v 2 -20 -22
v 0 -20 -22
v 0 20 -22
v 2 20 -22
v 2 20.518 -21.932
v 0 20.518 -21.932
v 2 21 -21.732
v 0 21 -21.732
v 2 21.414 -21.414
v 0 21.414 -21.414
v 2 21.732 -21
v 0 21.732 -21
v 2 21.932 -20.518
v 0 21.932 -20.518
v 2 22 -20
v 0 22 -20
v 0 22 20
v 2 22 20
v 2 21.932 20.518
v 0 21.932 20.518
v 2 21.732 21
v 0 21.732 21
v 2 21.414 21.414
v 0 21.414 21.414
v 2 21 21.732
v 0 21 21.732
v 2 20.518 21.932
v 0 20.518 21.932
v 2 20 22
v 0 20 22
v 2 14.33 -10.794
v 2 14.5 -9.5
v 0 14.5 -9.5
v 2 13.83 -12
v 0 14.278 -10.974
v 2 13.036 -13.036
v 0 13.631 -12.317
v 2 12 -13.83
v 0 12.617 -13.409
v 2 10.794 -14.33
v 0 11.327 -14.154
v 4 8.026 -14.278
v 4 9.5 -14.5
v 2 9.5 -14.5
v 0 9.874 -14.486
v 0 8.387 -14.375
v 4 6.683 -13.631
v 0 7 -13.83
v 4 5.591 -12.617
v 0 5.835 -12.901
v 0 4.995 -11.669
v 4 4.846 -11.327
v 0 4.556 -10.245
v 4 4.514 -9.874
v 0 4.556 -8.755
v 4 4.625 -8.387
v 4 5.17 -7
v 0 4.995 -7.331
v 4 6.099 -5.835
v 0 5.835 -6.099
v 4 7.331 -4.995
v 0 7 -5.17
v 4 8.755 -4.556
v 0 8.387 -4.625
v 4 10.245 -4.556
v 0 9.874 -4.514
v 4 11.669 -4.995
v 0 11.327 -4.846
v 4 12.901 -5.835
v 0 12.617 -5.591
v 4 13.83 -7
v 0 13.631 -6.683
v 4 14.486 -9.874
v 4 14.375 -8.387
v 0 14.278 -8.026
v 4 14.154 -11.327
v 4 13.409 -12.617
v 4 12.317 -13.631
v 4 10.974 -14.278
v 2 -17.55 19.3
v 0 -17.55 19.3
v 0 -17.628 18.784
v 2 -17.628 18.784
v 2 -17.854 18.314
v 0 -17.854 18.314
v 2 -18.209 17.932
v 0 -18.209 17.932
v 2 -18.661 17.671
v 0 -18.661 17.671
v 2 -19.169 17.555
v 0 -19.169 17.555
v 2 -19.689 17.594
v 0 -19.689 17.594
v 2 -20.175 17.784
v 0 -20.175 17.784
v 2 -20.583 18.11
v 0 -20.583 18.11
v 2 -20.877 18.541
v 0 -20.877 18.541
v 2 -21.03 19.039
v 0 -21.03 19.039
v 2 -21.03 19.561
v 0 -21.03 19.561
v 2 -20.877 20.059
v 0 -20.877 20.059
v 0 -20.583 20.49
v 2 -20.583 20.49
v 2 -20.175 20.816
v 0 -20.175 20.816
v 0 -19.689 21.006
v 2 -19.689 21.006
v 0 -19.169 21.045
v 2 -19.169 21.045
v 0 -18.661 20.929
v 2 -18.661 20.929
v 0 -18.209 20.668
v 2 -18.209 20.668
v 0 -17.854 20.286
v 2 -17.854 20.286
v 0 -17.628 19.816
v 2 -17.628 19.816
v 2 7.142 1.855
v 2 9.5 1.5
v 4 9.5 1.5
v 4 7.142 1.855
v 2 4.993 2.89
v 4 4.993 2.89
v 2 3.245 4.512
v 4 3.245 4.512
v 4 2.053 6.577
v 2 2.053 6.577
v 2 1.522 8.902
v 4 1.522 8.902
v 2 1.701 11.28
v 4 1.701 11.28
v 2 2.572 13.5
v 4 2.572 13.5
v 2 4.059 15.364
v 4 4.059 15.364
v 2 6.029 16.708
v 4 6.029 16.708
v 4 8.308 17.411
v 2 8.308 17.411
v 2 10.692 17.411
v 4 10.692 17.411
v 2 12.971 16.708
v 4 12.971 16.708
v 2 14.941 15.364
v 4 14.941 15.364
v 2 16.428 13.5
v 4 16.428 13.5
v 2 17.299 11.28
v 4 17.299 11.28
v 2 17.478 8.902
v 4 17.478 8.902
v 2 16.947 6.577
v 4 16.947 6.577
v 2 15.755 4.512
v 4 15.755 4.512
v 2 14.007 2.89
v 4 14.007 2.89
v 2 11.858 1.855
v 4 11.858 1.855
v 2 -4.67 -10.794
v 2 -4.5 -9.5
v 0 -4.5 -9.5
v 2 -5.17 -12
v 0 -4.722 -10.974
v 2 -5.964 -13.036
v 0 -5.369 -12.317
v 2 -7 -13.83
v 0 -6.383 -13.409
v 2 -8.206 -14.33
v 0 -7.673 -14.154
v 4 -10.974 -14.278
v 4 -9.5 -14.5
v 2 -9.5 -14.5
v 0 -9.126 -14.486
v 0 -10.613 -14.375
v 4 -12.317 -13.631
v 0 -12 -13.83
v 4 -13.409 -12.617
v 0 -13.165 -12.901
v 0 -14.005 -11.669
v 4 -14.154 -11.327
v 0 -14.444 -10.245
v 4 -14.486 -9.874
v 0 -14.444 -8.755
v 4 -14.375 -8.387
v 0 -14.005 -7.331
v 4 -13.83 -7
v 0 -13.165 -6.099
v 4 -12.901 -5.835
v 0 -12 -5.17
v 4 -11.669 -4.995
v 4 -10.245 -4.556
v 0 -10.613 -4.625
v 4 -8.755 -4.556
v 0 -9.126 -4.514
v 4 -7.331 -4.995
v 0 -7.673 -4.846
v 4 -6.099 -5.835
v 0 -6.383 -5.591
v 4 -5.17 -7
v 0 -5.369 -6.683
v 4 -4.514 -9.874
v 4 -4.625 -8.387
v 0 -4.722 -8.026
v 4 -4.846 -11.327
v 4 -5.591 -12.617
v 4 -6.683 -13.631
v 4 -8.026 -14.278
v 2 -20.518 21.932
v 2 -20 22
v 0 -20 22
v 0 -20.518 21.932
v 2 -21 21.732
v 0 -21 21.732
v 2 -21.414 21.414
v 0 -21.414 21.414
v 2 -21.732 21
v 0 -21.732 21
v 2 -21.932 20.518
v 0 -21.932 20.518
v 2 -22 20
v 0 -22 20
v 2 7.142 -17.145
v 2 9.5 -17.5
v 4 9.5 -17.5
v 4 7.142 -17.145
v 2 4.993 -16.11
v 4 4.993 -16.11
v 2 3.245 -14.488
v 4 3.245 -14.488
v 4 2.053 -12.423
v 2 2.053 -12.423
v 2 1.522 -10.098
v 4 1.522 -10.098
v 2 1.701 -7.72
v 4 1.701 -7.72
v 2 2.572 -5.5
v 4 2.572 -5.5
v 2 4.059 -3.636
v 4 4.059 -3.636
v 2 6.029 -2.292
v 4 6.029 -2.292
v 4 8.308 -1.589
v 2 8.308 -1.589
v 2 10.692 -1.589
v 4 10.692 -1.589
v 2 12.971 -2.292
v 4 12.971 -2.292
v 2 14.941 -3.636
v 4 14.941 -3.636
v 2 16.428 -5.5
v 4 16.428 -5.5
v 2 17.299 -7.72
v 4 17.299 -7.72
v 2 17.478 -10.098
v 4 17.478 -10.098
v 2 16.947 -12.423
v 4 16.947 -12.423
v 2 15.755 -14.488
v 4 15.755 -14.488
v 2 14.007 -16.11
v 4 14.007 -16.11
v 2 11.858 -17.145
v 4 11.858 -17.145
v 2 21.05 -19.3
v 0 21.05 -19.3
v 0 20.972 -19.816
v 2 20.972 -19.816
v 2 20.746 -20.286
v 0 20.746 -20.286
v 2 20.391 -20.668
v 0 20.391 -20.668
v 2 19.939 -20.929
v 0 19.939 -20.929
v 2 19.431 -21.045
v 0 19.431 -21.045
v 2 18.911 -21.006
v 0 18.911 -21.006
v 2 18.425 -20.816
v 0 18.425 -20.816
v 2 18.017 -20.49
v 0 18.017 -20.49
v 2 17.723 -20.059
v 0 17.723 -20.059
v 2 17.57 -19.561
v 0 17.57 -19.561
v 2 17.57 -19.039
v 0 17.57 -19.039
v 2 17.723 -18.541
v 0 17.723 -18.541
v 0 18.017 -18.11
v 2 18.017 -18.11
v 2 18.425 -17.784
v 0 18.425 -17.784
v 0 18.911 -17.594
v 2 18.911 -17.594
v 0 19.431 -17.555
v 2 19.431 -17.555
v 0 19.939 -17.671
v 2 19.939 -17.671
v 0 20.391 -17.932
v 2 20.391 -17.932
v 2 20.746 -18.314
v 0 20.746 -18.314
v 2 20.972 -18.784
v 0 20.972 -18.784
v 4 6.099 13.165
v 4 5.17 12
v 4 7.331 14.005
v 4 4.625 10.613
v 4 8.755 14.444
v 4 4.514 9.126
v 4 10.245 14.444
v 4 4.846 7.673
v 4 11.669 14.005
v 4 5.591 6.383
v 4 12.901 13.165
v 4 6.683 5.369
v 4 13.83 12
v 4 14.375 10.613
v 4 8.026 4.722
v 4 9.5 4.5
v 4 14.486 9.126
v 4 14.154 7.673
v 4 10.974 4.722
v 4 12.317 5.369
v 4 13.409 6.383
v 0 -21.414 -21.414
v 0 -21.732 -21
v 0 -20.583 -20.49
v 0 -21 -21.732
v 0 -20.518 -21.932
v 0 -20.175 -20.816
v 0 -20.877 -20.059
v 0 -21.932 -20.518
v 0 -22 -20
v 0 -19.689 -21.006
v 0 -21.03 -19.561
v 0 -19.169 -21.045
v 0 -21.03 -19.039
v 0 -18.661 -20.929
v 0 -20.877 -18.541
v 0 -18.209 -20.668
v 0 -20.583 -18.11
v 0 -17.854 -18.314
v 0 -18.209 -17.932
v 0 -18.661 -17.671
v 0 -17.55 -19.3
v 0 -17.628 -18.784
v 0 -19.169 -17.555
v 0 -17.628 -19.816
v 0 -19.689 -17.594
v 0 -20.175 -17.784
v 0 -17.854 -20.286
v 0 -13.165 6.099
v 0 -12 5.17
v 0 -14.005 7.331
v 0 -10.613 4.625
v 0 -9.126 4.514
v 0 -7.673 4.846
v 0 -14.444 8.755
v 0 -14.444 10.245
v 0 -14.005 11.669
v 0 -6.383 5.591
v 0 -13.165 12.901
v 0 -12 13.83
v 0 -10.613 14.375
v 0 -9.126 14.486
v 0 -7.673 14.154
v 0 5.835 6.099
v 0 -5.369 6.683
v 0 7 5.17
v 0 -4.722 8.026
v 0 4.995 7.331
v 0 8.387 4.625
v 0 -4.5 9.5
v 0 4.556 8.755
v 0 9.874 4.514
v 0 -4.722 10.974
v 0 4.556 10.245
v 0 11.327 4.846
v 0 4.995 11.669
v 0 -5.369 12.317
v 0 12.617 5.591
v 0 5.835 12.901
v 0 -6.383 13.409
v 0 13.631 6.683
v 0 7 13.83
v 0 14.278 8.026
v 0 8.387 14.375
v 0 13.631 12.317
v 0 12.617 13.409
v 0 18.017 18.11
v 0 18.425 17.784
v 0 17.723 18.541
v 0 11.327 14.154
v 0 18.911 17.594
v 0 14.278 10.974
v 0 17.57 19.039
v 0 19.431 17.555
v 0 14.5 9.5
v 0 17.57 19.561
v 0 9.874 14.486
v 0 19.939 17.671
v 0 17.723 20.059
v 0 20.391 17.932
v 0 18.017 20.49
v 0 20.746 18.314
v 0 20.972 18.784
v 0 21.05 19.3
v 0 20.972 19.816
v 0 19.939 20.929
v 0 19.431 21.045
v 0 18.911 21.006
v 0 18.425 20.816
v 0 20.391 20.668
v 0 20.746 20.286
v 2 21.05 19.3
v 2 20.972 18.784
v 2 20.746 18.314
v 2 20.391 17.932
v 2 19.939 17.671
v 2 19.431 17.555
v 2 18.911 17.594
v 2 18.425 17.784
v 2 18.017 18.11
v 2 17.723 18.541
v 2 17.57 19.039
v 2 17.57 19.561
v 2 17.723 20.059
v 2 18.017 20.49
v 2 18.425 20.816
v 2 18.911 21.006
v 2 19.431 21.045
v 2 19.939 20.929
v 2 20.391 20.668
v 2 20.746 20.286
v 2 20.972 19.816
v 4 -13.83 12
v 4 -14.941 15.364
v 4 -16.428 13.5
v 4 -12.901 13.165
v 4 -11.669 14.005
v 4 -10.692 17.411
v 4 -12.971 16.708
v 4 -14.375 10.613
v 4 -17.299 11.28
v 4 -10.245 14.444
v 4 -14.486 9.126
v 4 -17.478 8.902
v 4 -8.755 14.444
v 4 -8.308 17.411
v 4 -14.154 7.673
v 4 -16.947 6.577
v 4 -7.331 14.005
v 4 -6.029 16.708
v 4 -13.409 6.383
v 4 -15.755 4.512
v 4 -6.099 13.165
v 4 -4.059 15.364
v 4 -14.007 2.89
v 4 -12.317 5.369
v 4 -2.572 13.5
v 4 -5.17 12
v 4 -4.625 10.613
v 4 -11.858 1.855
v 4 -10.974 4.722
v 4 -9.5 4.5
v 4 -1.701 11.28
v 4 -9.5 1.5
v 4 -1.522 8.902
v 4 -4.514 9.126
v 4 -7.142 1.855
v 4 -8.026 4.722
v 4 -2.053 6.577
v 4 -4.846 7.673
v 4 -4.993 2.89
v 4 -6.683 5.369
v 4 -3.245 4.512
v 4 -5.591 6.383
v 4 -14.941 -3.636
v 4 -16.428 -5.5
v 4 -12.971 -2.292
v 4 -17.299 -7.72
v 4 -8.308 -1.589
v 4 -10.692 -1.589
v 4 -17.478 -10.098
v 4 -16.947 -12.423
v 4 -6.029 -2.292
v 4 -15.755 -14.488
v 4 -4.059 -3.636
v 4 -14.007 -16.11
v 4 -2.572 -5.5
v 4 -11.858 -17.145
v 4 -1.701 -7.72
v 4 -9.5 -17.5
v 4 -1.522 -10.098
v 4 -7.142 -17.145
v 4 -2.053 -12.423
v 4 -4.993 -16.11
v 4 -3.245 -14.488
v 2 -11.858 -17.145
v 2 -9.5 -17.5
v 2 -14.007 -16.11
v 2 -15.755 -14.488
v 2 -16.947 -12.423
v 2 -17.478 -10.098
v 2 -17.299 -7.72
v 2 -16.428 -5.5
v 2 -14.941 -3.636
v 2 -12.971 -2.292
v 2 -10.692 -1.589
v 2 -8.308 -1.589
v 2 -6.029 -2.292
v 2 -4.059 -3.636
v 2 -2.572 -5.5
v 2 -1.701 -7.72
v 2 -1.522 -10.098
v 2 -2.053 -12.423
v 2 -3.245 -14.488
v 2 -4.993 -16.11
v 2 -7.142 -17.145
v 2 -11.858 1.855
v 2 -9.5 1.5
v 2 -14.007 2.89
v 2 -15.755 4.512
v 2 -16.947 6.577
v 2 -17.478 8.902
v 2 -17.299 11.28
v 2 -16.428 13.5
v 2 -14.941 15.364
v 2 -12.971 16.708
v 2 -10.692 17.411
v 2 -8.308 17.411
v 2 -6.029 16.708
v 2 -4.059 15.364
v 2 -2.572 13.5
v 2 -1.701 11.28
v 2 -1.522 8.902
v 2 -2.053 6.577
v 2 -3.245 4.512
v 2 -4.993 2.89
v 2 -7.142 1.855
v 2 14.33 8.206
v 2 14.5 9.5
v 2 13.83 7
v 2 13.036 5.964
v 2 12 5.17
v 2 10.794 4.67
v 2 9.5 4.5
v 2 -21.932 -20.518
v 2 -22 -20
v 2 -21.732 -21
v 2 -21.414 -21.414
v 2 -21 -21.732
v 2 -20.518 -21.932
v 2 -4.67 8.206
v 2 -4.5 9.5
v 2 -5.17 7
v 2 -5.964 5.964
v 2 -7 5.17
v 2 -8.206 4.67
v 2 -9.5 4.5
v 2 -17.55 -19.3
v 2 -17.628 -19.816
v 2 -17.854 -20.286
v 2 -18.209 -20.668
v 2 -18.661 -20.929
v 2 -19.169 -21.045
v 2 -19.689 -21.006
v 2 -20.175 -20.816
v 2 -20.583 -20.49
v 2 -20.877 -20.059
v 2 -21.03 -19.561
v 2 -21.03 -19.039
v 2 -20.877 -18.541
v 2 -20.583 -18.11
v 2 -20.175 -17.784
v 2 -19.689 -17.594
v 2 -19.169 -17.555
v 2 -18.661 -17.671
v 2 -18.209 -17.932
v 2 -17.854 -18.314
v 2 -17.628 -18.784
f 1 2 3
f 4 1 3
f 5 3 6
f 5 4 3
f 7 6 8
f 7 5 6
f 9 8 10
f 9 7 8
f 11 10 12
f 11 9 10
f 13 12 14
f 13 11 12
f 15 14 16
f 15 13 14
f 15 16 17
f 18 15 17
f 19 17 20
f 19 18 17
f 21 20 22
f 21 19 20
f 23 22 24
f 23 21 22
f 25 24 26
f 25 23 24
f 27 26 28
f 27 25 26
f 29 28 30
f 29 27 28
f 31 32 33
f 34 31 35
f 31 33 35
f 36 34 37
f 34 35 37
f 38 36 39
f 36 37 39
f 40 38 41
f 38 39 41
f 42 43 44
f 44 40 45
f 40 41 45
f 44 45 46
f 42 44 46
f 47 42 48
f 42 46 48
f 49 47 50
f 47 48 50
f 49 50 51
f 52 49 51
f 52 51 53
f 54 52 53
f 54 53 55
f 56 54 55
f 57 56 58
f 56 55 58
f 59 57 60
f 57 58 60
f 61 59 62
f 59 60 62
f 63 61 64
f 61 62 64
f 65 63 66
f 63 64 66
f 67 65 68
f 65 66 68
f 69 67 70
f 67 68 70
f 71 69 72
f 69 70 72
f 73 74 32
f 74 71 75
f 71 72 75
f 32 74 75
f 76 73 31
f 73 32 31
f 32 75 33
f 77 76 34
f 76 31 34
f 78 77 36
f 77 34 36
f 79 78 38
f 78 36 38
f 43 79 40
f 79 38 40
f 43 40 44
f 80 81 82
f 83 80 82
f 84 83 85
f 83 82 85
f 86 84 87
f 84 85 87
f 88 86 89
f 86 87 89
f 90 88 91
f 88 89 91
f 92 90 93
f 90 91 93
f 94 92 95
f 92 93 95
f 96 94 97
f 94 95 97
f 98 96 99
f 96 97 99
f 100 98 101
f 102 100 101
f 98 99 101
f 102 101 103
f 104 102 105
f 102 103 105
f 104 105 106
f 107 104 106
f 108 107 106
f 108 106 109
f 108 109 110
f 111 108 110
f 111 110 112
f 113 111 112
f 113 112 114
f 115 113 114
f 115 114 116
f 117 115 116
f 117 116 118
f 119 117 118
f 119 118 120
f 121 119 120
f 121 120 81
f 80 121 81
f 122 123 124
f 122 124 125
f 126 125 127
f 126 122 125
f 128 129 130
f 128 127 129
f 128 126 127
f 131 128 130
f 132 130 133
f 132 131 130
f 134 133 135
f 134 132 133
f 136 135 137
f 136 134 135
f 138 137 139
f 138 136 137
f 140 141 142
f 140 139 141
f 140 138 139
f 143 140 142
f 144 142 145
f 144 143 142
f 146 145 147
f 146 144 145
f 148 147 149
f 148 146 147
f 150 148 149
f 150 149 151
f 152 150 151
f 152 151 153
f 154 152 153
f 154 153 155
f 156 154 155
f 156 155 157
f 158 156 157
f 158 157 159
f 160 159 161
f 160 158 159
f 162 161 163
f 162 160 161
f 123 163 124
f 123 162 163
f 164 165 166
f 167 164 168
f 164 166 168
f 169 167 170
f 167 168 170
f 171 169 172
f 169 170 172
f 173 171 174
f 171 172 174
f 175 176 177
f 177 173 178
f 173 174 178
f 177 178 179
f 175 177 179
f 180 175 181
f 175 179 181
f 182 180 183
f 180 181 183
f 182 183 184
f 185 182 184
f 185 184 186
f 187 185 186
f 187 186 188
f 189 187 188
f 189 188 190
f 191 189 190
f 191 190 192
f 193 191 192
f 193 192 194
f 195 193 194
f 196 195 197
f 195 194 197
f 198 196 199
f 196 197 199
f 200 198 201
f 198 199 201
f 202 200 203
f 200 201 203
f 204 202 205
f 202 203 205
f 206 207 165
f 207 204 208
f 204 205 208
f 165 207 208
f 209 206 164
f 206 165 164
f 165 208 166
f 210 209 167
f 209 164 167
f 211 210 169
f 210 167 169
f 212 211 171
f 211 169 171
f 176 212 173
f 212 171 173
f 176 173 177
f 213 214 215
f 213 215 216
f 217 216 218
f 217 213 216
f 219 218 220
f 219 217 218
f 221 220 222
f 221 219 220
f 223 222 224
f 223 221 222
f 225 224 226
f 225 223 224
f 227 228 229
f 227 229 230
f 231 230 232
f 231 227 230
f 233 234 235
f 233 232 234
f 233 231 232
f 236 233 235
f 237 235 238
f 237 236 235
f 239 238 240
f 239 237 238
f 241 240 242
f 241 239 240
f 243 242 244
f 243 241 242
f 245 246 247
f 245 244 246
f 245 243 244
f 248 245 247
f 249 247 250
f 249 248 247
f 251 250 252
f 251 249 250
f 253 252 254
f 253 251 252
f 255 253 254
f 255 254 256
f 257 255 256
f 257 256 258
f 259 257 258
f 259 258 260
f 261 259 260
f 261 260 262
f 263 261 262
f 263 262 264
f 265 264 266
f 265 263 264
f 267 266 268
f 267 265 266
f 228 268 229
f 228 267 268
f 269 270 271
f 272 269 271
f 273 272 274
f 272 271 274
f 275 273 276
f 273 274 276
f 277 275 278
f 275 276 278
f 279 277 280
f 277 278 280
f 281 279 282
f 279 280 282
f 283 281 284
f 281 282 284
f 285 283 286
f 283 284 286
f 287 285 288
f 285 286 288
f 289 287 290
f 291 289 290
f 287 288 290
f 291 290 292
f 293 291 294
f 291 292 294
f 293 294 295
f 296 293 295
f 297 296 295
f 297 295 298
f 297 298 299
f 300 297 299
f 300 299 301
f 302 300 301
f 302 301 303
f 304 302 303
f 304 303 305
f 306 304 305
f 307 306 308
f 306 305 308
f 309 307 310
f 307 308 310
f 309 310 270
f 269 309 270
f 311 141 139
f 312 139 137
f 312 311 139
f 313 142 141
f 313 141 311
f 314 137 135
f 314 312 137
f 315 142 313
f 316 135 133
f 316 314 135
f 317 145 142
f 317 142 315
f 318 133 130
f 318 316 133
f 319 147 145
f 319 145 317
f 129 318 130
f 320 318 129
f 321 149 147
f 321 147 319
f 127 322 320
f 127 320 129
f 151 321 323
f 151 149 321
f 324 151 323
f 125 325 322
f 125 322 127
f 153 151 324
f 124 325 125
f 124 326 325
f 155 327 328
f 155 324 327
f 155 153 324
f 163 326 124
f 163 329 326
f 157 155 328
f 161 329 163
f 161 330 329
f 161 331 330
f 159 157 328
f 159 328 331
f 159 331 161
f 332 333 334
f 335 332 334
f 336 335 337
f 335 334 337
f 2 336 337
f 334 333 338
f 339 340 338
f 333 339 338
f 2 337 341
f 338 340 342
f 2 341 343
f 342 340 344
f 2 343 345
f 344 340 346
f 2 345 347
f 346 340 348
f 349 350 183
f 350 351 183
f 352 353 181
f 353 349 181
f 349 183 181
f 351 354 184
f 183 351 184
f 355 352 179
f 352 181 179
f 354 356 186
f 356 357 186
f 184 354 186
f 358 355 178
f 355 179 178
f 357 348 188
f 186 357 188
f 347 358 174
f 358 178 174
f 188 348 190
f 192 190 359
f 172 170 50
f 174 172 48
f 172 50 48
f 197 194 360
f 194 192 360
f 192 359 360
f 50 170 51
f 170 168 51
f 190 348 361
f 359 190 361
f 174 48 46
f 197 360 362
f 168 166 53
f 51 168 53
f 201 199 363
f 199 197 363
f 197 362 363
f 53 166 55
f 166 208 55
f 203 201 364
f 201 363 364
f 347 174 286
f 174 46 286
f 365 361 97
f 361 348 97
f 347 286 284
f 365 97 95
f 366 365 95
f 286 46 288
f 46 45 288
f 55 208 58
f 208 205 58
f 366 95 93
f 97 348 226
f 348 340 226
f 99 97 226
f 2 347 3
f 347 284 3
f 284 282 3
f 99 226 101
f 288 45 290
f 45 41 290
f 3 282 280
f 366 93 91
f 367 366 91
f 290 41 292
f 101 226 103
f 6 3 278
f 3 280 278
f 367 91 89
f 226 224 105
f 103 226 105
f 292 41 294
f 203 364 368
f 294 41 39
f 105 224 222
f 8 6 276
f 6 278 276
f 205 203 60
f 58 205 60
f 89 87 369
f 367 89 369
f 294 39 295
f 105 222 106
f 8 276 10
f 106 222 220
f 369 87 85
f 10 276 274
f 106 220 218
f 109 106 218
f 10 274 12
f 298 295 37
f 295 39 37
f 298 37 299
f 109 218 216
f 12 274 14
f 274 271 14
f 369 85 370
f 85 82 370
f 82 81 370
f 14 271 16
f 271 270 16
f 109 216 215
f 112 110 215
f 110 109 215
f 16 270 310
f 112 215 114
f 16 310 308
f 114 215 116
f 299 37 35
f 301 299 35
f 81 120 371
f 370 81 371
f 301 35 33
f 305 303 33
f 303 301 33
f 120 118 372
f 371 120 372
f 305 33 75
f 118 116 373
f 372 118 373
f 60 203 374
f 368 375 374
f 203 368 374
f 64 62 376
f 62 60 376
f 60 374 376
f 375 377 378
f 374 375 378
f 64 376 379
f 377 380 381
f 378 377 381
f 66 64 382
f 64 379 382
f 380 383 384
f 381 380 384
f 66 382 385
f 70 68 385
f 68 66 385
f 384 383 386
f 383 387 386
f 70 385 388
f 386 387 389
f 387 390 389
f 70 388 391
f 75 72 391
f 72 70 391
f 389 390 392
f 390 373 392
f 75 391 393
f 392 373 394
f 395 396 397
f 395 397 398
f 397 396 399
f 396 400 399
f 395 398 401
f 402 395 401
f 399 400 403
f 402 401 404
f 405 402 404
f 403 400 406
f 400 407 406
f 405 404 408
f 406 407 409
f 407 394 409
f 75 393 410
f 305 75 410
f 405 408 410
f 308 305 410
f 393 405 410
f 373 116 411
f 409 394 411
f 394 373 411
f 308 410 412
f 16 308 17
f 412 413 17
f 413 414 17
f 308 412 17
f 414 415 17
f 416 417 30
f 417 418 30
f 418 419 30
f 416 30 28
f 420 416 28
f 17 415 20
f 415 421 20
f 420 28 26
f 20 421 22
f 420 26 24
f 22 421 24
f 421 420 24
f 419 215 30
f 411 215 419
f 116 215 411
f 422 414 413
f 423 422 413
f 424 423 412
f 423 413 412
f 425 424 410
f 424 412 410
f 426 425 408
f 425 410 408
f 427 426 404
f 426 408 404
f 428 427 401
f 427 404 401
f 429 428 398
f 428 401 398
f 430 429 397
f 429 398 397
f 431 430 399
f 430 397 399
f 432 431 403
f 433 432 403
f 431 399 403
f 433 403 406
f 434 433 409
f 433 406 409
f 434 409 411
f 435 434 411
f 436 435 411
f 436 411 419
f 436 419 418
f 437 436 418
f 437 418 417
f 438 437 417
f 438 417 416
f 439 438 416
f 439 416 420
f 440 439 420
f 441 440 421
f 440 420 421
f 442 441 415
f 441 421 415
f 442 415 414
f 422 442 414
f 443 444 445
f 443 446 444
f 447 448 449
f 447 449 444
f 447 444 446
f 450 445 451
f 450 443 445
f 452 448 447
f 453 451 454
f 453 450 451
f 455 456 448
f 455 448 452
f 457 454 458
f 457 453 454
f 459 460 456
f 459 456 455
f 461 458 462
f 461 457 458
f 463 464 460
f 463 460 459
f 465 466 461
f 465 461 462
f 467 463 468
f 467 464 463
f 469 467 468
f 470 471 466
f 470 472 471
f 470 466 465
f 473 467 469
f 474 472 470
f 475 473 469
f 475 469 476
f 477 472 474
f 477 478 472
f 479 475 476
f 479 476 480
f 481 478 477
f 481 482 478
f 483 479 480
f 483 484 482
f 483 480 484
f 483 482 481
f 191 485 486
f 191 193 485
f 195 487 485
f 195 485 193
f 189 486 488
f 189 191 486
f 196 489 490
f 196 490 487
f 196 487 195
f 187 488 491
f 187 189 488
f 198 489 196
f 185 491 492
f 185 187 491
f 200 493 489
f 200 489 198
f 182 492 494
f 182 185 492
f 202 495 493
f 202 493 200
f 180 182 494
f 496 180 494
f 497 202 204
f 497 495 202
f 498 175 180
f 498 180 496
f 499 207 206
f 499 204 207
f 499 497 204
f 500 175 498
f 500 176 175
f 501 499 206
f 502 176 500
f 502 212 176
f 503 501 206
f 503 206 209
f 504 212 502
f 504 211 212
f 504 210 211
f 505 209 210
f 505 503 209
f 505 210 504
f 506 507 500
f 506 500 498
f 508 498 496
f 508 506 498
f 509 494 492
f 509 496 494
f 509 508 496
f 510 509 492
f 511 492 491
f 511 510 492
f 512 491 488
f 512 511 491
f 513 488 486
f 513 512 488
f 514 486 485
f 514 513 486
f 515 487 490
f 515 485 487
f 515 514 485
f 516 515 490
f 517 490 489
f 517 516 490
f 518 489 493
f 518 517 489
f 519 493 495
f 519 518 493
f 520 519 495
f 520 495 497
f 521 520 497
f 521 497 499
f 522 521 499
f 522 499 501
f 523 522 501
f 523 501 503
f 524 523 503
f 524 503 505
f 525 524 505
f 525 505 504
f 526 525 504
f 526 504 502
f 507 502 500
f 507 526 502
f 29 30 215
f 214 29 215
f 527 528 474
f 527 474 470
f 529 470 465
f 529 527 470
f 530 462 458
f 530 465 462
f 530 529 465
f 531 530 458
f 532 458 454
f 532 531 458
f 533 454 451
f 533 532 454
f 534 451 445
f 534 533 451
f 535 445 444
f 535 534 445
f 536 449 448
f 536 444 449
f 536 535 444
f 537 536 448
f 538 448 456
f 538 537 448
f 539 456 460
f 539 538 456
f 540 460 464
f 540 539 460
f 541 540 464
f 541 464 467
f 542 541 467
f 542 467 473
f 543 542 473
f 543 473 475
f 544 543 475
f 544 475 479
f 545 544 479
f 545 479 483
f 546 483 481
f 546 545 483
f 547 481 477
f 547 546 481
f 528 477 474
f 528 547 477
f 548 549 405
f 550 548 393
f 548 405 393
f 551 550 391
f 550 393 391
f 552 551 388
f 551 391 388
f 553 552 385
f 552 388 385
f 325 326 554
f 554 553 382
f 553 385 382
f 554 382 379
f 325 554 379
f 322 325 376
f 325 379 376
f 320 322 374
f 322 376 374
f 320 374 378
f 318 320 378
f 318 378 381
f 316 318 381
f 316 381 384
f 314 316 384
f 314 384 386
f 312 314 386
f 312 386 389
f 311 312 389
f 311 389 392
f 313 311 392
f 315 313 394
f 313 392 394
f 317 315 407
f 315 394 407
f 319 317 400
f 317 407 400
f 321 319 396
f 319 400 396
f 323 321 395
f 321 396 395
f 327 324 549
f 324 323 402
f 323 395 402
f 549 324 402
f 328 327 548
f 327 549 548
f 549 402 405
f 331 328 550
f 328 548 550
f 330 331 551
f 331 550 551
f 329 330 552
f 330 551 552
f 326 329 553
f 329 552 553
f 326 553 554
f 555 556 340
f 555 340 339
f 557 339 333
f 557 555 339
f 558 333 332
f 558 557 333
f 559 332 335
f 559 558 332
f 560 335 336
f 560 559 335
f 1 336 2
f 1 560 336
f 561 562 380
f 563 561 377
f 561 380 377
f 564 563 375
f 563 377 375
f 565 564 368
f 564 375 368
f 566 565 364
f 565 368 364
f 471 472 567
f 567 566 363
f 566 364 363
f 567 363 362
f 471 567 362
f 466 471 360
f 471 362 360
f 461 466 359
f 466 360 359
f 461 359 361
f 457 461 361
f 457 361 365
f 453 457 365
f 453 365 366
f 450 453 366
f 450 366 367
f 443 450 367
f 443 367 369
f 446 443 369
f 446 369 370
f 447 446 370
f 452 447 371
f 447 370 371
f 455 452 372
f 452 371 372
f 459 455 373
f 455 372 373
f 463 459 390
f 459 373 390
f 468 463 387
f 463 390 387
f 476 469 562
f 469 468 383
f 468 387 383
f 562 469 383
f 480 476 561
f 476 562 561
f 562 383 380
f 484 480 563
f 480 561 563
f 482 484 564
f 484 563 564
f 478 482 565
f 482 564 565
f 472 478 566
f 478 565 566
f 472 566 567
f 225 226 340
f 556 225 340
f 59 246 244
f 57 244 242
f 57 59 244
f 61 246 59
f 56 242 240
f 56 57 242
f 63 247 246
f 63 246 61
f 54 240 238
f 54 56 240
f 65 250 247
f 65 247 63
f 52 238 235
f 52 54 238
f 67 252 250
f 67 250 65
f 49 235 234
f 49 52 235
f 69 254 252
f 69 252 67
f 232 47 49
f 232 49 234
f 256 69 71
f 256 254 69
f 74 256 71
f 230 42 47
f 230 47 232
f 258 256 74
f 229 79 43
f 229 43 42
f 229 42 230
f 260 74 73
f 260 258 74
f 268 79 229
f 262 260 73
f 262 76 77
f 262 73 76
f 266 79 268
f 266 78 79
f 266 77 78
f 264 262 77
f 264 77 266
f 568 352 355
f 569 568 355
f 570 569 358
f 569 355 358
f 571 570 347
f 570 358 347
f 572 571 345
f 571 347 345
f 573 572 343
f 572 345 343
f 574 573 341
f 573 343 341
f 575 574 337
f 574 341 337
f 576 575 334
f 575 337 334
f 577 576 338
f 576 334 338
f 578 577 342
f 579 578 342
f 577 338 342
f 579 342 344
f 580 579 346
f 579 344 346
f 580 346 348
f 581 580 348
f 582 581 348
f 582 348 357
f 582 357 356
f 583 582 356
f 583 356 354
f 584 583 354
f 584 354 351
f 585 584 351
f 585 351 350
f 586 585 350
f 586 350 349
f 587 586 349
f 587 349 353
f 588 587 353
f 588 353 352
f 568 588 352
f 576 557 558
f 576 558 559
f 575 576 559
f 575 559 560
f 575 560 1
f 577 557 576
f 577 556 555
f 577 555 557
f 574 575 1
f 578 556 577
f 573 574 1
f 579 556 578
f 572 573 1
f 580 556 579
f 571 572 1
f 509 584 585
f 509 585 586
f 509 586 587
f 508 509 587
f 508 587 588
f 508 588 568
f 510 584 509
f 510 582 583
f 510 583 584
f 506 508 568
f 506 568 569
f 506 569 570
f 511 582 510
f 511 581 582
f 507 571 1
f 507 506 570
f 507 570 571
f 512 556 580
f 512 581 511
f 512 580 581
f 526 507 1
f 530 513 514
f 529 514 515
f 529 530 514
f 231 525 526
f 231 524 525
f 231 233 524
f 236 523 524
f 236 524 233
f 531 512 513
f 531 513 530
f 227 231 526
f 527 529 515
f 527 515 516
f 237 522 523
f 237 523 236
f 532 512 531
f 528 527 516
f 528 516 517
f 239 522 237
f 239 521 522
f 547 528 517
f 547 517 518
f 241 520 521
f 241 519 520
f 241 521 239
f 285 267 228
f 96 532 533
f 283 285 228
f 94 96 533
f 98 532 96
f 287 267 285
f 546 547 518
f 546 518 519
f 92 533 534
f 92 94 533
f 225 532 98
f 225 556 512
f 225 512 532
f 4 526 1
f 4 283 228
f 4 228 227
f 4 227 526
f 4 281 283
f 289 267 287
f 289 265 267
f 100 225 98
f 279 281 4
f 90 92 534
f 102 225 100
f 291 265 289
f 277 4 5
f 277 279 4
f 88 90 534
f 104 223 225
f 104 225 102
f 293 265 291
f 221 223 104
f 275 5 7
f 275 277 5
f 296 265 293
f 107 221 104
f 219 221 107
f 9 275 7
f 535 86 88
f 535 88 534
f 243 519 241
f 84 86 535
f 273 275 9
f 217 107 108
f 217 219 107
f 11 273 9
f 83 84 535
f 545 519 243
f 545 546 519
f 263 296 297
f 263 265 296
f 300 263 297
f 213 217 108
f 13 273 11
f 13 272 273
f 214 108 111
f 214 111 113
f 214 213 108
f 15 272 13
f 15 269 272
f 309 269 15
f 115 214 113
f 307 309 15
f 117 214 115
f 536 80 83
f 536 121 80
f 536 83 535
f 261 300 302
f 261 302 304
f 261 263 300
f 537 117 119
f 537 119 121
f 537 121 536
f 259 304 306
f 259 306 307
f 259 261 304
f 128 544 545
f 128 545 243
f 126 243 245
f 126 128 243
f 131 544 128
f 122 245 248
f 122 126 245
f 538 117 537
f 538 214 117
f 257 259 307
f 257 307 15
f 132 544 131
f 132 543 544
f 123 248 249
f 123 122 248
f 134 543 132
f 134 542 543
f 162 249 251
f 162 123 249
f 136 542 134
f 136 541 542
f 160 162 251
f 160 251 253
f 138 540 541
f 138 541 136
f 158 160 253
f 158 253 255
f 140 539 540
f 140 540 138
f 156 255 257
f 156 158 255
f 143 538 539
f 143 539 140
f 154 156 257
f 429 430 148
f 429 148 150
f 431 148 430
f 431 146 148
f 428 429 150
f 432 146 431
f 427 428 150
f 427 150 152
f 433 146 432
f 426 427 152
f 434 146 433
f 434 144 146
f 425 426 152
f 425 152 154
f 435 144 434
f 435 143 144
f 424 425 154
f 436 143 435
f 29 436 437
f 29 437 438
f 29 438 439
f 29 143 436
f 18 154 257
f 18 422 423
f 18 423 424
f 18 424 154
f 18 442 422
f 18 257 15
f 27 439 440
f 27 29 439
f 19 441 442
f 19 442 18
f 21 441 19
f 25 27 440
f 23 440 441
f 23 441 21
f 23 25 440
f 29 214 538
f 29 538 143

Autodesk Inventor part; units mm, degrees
ref_plane "YZ Plane" through (0, 0, 0) normal (1, 0, 0) x (0, 1, 0)
ref_plane "XZ Plane" through (0, 0, 0) normal (0, 1, 0) x (-1, 0, 0)
ref_plane "XY Plane" through (0, 0, 0) normal (0, 0, 1) x (1, 0, 0)
sketch "Sketch1" plane through (0, 0, 0) normal (1, 0, 0) x (0, 1, 0)
  line L0 (-22, -22) -> (22, -22)
  line L1 (22, -22) -> (22, 22)
  line L2 (22, 22) -> (-22, 22)
  line L3 (-22, 22) -> (-22, -22)
  line L4 (-22, -22) -> (22, 22) construction
  line L5 (22, -22) -> (-22, 22) construction
  line L6 (-19.3, -19.3) -> (19.3, -19.3)
  line L7 (19.3, -19.3) -> (19.3, 19.3)
  line L8 (19.3, 19.3) -> (-19.3, 19.3)
  line L9 (-19.3, 19.3) -> (-19.3, -19.3)
  line L10 (-19.3, -19.3) -> (19.3, 19.3) construction
  line L11 (19.3, -19.3) -> (-19.3, 19.3) construction
  circle A0 centre (19.3, 19.3) radius 1.75
  circle A1 centre (19.3, -19.3) radius 1.75
  circle A2 centre (-19.3, -19.3) radius 1.75
  circle A3 centre (-19.3, 19.3) radius 1.75
  line L12 (19.3, 0) -> (0, 0)
  circle A4 centre (9.5, -9.5) radius 5
  circle A5 centre (9.5, 9.5) radius 5
  line L13 (0, 0) -> (-19.3, 0)
  circle A6 centre (-9.5, -9.5) radius 5
  circle A7 centre (-9.5, 9.5) radius 5
  circle A8 centre (9.5, -9.5) radius 9.5
  circle A9 centre (9.5, 9.5) radius 9.5
  circle A10 centre (-9.5, 9.5) radius 9.5
  circle A11 centre (-9.5, -9.5) radius 9.5
  point P0 (0, 0)
  point P1 (0, 0)
  point P2 (6.364, 6.364)
  dimension "d0" = 44
  dimension "d1" = 44
  dimension "d6" = 38.6
  dimension "d7" = 38.6
  dimension "d8" = 3.5
  dimension "d9" = 3.5
  dimension "d10" = 3.5
  dimension "d11" = 3.5
  dimension "d19" = 10
  dimension "d20" = 10
  dimension "d21" = 10
  dimension "d22" = 10
  dimension "d23" = 19
  dimension "d24" = 19
  dimension "d25" = 19
  dimension "d26" = 19
extrude "Extrusion1" add sketch "Sketch1" along normal blind 2 contours L3 L2 L1 L0 | A2 L9 L13 A11 A8 L12 L7 A1 L6 | L9 A3 L8 A0 L7 L12 A9 A10 L13 | A10 A9 L12 L13 | A10 | L13 L12 A8 A11 | A11 | A9 | A8
fillet "Fillet1" radius 2 4 edges at (1, -22, 22) (1, -22, -22) (1, 22, -22) (1, 22, 22)
sketch "Sketch2" plane through (2, 0, 0) normal (1, 0, 0) x (0, 0, -1)
  arc A0 (-20, 22) -> (-22, 20) centre (-20, 20) ccw projected
  line L0 (-22, 20) -> (-22, -20) projected
  arc A1 (-22, -20) -> (-20, -22) centre (-20, -20) ccw projected
  line L1 (-20, -22) -> (20, -22) projected
  arc A2 (20, -22) -> (22, -20) centre (20, -20) ccw projected
  line L2 (22, -20) -> (22, 20) projected
  arc A3 (22, 20) -> (20, 22) centre (20, 20) ccw projected
  line L3 (20, 22) -> (-20, 22) projected
  circle A4 centre (-19.3, -19.3) radius 1.75 projected
  circle A5 centre (19.3, -19.3) radius 1.75 projected
  circle A6 centre (9.5, 9.5) radius 5 projected
  circle A7 centre (9.5, -9.5) radius 5 projected
  circle A8 centre (19.3, 19.3) radius 1.75 projected
  circle A9 centre (-9.5, 9.5) radius 5 projected
  circle A10 centre (-9.5, -9.5) radius 5 projected
  circle A11 centre (-19.3, 19.3) radius 1.75 projected
  circle A12 centre (-9.5, -9.5) radius 8
  circle A13 centre (-9.5, 9.5) radius 8
  circle A14 centre (9.5, 9.5) radius 8
  circle A15 centre (9.5, -9.5) radius 8
  point P0 (0, 0)
  dimension "d27" = 16
  dimension "d28" = 16
  dimension "d29" = 16
  dimension "d30" = 16
extrude "Extrusion2" add sketch "Sketch2" along normal blind 2 contours A12 | A13 | A14 | A15
properties part number "BatteryRoof" material "ABS Plastic"
